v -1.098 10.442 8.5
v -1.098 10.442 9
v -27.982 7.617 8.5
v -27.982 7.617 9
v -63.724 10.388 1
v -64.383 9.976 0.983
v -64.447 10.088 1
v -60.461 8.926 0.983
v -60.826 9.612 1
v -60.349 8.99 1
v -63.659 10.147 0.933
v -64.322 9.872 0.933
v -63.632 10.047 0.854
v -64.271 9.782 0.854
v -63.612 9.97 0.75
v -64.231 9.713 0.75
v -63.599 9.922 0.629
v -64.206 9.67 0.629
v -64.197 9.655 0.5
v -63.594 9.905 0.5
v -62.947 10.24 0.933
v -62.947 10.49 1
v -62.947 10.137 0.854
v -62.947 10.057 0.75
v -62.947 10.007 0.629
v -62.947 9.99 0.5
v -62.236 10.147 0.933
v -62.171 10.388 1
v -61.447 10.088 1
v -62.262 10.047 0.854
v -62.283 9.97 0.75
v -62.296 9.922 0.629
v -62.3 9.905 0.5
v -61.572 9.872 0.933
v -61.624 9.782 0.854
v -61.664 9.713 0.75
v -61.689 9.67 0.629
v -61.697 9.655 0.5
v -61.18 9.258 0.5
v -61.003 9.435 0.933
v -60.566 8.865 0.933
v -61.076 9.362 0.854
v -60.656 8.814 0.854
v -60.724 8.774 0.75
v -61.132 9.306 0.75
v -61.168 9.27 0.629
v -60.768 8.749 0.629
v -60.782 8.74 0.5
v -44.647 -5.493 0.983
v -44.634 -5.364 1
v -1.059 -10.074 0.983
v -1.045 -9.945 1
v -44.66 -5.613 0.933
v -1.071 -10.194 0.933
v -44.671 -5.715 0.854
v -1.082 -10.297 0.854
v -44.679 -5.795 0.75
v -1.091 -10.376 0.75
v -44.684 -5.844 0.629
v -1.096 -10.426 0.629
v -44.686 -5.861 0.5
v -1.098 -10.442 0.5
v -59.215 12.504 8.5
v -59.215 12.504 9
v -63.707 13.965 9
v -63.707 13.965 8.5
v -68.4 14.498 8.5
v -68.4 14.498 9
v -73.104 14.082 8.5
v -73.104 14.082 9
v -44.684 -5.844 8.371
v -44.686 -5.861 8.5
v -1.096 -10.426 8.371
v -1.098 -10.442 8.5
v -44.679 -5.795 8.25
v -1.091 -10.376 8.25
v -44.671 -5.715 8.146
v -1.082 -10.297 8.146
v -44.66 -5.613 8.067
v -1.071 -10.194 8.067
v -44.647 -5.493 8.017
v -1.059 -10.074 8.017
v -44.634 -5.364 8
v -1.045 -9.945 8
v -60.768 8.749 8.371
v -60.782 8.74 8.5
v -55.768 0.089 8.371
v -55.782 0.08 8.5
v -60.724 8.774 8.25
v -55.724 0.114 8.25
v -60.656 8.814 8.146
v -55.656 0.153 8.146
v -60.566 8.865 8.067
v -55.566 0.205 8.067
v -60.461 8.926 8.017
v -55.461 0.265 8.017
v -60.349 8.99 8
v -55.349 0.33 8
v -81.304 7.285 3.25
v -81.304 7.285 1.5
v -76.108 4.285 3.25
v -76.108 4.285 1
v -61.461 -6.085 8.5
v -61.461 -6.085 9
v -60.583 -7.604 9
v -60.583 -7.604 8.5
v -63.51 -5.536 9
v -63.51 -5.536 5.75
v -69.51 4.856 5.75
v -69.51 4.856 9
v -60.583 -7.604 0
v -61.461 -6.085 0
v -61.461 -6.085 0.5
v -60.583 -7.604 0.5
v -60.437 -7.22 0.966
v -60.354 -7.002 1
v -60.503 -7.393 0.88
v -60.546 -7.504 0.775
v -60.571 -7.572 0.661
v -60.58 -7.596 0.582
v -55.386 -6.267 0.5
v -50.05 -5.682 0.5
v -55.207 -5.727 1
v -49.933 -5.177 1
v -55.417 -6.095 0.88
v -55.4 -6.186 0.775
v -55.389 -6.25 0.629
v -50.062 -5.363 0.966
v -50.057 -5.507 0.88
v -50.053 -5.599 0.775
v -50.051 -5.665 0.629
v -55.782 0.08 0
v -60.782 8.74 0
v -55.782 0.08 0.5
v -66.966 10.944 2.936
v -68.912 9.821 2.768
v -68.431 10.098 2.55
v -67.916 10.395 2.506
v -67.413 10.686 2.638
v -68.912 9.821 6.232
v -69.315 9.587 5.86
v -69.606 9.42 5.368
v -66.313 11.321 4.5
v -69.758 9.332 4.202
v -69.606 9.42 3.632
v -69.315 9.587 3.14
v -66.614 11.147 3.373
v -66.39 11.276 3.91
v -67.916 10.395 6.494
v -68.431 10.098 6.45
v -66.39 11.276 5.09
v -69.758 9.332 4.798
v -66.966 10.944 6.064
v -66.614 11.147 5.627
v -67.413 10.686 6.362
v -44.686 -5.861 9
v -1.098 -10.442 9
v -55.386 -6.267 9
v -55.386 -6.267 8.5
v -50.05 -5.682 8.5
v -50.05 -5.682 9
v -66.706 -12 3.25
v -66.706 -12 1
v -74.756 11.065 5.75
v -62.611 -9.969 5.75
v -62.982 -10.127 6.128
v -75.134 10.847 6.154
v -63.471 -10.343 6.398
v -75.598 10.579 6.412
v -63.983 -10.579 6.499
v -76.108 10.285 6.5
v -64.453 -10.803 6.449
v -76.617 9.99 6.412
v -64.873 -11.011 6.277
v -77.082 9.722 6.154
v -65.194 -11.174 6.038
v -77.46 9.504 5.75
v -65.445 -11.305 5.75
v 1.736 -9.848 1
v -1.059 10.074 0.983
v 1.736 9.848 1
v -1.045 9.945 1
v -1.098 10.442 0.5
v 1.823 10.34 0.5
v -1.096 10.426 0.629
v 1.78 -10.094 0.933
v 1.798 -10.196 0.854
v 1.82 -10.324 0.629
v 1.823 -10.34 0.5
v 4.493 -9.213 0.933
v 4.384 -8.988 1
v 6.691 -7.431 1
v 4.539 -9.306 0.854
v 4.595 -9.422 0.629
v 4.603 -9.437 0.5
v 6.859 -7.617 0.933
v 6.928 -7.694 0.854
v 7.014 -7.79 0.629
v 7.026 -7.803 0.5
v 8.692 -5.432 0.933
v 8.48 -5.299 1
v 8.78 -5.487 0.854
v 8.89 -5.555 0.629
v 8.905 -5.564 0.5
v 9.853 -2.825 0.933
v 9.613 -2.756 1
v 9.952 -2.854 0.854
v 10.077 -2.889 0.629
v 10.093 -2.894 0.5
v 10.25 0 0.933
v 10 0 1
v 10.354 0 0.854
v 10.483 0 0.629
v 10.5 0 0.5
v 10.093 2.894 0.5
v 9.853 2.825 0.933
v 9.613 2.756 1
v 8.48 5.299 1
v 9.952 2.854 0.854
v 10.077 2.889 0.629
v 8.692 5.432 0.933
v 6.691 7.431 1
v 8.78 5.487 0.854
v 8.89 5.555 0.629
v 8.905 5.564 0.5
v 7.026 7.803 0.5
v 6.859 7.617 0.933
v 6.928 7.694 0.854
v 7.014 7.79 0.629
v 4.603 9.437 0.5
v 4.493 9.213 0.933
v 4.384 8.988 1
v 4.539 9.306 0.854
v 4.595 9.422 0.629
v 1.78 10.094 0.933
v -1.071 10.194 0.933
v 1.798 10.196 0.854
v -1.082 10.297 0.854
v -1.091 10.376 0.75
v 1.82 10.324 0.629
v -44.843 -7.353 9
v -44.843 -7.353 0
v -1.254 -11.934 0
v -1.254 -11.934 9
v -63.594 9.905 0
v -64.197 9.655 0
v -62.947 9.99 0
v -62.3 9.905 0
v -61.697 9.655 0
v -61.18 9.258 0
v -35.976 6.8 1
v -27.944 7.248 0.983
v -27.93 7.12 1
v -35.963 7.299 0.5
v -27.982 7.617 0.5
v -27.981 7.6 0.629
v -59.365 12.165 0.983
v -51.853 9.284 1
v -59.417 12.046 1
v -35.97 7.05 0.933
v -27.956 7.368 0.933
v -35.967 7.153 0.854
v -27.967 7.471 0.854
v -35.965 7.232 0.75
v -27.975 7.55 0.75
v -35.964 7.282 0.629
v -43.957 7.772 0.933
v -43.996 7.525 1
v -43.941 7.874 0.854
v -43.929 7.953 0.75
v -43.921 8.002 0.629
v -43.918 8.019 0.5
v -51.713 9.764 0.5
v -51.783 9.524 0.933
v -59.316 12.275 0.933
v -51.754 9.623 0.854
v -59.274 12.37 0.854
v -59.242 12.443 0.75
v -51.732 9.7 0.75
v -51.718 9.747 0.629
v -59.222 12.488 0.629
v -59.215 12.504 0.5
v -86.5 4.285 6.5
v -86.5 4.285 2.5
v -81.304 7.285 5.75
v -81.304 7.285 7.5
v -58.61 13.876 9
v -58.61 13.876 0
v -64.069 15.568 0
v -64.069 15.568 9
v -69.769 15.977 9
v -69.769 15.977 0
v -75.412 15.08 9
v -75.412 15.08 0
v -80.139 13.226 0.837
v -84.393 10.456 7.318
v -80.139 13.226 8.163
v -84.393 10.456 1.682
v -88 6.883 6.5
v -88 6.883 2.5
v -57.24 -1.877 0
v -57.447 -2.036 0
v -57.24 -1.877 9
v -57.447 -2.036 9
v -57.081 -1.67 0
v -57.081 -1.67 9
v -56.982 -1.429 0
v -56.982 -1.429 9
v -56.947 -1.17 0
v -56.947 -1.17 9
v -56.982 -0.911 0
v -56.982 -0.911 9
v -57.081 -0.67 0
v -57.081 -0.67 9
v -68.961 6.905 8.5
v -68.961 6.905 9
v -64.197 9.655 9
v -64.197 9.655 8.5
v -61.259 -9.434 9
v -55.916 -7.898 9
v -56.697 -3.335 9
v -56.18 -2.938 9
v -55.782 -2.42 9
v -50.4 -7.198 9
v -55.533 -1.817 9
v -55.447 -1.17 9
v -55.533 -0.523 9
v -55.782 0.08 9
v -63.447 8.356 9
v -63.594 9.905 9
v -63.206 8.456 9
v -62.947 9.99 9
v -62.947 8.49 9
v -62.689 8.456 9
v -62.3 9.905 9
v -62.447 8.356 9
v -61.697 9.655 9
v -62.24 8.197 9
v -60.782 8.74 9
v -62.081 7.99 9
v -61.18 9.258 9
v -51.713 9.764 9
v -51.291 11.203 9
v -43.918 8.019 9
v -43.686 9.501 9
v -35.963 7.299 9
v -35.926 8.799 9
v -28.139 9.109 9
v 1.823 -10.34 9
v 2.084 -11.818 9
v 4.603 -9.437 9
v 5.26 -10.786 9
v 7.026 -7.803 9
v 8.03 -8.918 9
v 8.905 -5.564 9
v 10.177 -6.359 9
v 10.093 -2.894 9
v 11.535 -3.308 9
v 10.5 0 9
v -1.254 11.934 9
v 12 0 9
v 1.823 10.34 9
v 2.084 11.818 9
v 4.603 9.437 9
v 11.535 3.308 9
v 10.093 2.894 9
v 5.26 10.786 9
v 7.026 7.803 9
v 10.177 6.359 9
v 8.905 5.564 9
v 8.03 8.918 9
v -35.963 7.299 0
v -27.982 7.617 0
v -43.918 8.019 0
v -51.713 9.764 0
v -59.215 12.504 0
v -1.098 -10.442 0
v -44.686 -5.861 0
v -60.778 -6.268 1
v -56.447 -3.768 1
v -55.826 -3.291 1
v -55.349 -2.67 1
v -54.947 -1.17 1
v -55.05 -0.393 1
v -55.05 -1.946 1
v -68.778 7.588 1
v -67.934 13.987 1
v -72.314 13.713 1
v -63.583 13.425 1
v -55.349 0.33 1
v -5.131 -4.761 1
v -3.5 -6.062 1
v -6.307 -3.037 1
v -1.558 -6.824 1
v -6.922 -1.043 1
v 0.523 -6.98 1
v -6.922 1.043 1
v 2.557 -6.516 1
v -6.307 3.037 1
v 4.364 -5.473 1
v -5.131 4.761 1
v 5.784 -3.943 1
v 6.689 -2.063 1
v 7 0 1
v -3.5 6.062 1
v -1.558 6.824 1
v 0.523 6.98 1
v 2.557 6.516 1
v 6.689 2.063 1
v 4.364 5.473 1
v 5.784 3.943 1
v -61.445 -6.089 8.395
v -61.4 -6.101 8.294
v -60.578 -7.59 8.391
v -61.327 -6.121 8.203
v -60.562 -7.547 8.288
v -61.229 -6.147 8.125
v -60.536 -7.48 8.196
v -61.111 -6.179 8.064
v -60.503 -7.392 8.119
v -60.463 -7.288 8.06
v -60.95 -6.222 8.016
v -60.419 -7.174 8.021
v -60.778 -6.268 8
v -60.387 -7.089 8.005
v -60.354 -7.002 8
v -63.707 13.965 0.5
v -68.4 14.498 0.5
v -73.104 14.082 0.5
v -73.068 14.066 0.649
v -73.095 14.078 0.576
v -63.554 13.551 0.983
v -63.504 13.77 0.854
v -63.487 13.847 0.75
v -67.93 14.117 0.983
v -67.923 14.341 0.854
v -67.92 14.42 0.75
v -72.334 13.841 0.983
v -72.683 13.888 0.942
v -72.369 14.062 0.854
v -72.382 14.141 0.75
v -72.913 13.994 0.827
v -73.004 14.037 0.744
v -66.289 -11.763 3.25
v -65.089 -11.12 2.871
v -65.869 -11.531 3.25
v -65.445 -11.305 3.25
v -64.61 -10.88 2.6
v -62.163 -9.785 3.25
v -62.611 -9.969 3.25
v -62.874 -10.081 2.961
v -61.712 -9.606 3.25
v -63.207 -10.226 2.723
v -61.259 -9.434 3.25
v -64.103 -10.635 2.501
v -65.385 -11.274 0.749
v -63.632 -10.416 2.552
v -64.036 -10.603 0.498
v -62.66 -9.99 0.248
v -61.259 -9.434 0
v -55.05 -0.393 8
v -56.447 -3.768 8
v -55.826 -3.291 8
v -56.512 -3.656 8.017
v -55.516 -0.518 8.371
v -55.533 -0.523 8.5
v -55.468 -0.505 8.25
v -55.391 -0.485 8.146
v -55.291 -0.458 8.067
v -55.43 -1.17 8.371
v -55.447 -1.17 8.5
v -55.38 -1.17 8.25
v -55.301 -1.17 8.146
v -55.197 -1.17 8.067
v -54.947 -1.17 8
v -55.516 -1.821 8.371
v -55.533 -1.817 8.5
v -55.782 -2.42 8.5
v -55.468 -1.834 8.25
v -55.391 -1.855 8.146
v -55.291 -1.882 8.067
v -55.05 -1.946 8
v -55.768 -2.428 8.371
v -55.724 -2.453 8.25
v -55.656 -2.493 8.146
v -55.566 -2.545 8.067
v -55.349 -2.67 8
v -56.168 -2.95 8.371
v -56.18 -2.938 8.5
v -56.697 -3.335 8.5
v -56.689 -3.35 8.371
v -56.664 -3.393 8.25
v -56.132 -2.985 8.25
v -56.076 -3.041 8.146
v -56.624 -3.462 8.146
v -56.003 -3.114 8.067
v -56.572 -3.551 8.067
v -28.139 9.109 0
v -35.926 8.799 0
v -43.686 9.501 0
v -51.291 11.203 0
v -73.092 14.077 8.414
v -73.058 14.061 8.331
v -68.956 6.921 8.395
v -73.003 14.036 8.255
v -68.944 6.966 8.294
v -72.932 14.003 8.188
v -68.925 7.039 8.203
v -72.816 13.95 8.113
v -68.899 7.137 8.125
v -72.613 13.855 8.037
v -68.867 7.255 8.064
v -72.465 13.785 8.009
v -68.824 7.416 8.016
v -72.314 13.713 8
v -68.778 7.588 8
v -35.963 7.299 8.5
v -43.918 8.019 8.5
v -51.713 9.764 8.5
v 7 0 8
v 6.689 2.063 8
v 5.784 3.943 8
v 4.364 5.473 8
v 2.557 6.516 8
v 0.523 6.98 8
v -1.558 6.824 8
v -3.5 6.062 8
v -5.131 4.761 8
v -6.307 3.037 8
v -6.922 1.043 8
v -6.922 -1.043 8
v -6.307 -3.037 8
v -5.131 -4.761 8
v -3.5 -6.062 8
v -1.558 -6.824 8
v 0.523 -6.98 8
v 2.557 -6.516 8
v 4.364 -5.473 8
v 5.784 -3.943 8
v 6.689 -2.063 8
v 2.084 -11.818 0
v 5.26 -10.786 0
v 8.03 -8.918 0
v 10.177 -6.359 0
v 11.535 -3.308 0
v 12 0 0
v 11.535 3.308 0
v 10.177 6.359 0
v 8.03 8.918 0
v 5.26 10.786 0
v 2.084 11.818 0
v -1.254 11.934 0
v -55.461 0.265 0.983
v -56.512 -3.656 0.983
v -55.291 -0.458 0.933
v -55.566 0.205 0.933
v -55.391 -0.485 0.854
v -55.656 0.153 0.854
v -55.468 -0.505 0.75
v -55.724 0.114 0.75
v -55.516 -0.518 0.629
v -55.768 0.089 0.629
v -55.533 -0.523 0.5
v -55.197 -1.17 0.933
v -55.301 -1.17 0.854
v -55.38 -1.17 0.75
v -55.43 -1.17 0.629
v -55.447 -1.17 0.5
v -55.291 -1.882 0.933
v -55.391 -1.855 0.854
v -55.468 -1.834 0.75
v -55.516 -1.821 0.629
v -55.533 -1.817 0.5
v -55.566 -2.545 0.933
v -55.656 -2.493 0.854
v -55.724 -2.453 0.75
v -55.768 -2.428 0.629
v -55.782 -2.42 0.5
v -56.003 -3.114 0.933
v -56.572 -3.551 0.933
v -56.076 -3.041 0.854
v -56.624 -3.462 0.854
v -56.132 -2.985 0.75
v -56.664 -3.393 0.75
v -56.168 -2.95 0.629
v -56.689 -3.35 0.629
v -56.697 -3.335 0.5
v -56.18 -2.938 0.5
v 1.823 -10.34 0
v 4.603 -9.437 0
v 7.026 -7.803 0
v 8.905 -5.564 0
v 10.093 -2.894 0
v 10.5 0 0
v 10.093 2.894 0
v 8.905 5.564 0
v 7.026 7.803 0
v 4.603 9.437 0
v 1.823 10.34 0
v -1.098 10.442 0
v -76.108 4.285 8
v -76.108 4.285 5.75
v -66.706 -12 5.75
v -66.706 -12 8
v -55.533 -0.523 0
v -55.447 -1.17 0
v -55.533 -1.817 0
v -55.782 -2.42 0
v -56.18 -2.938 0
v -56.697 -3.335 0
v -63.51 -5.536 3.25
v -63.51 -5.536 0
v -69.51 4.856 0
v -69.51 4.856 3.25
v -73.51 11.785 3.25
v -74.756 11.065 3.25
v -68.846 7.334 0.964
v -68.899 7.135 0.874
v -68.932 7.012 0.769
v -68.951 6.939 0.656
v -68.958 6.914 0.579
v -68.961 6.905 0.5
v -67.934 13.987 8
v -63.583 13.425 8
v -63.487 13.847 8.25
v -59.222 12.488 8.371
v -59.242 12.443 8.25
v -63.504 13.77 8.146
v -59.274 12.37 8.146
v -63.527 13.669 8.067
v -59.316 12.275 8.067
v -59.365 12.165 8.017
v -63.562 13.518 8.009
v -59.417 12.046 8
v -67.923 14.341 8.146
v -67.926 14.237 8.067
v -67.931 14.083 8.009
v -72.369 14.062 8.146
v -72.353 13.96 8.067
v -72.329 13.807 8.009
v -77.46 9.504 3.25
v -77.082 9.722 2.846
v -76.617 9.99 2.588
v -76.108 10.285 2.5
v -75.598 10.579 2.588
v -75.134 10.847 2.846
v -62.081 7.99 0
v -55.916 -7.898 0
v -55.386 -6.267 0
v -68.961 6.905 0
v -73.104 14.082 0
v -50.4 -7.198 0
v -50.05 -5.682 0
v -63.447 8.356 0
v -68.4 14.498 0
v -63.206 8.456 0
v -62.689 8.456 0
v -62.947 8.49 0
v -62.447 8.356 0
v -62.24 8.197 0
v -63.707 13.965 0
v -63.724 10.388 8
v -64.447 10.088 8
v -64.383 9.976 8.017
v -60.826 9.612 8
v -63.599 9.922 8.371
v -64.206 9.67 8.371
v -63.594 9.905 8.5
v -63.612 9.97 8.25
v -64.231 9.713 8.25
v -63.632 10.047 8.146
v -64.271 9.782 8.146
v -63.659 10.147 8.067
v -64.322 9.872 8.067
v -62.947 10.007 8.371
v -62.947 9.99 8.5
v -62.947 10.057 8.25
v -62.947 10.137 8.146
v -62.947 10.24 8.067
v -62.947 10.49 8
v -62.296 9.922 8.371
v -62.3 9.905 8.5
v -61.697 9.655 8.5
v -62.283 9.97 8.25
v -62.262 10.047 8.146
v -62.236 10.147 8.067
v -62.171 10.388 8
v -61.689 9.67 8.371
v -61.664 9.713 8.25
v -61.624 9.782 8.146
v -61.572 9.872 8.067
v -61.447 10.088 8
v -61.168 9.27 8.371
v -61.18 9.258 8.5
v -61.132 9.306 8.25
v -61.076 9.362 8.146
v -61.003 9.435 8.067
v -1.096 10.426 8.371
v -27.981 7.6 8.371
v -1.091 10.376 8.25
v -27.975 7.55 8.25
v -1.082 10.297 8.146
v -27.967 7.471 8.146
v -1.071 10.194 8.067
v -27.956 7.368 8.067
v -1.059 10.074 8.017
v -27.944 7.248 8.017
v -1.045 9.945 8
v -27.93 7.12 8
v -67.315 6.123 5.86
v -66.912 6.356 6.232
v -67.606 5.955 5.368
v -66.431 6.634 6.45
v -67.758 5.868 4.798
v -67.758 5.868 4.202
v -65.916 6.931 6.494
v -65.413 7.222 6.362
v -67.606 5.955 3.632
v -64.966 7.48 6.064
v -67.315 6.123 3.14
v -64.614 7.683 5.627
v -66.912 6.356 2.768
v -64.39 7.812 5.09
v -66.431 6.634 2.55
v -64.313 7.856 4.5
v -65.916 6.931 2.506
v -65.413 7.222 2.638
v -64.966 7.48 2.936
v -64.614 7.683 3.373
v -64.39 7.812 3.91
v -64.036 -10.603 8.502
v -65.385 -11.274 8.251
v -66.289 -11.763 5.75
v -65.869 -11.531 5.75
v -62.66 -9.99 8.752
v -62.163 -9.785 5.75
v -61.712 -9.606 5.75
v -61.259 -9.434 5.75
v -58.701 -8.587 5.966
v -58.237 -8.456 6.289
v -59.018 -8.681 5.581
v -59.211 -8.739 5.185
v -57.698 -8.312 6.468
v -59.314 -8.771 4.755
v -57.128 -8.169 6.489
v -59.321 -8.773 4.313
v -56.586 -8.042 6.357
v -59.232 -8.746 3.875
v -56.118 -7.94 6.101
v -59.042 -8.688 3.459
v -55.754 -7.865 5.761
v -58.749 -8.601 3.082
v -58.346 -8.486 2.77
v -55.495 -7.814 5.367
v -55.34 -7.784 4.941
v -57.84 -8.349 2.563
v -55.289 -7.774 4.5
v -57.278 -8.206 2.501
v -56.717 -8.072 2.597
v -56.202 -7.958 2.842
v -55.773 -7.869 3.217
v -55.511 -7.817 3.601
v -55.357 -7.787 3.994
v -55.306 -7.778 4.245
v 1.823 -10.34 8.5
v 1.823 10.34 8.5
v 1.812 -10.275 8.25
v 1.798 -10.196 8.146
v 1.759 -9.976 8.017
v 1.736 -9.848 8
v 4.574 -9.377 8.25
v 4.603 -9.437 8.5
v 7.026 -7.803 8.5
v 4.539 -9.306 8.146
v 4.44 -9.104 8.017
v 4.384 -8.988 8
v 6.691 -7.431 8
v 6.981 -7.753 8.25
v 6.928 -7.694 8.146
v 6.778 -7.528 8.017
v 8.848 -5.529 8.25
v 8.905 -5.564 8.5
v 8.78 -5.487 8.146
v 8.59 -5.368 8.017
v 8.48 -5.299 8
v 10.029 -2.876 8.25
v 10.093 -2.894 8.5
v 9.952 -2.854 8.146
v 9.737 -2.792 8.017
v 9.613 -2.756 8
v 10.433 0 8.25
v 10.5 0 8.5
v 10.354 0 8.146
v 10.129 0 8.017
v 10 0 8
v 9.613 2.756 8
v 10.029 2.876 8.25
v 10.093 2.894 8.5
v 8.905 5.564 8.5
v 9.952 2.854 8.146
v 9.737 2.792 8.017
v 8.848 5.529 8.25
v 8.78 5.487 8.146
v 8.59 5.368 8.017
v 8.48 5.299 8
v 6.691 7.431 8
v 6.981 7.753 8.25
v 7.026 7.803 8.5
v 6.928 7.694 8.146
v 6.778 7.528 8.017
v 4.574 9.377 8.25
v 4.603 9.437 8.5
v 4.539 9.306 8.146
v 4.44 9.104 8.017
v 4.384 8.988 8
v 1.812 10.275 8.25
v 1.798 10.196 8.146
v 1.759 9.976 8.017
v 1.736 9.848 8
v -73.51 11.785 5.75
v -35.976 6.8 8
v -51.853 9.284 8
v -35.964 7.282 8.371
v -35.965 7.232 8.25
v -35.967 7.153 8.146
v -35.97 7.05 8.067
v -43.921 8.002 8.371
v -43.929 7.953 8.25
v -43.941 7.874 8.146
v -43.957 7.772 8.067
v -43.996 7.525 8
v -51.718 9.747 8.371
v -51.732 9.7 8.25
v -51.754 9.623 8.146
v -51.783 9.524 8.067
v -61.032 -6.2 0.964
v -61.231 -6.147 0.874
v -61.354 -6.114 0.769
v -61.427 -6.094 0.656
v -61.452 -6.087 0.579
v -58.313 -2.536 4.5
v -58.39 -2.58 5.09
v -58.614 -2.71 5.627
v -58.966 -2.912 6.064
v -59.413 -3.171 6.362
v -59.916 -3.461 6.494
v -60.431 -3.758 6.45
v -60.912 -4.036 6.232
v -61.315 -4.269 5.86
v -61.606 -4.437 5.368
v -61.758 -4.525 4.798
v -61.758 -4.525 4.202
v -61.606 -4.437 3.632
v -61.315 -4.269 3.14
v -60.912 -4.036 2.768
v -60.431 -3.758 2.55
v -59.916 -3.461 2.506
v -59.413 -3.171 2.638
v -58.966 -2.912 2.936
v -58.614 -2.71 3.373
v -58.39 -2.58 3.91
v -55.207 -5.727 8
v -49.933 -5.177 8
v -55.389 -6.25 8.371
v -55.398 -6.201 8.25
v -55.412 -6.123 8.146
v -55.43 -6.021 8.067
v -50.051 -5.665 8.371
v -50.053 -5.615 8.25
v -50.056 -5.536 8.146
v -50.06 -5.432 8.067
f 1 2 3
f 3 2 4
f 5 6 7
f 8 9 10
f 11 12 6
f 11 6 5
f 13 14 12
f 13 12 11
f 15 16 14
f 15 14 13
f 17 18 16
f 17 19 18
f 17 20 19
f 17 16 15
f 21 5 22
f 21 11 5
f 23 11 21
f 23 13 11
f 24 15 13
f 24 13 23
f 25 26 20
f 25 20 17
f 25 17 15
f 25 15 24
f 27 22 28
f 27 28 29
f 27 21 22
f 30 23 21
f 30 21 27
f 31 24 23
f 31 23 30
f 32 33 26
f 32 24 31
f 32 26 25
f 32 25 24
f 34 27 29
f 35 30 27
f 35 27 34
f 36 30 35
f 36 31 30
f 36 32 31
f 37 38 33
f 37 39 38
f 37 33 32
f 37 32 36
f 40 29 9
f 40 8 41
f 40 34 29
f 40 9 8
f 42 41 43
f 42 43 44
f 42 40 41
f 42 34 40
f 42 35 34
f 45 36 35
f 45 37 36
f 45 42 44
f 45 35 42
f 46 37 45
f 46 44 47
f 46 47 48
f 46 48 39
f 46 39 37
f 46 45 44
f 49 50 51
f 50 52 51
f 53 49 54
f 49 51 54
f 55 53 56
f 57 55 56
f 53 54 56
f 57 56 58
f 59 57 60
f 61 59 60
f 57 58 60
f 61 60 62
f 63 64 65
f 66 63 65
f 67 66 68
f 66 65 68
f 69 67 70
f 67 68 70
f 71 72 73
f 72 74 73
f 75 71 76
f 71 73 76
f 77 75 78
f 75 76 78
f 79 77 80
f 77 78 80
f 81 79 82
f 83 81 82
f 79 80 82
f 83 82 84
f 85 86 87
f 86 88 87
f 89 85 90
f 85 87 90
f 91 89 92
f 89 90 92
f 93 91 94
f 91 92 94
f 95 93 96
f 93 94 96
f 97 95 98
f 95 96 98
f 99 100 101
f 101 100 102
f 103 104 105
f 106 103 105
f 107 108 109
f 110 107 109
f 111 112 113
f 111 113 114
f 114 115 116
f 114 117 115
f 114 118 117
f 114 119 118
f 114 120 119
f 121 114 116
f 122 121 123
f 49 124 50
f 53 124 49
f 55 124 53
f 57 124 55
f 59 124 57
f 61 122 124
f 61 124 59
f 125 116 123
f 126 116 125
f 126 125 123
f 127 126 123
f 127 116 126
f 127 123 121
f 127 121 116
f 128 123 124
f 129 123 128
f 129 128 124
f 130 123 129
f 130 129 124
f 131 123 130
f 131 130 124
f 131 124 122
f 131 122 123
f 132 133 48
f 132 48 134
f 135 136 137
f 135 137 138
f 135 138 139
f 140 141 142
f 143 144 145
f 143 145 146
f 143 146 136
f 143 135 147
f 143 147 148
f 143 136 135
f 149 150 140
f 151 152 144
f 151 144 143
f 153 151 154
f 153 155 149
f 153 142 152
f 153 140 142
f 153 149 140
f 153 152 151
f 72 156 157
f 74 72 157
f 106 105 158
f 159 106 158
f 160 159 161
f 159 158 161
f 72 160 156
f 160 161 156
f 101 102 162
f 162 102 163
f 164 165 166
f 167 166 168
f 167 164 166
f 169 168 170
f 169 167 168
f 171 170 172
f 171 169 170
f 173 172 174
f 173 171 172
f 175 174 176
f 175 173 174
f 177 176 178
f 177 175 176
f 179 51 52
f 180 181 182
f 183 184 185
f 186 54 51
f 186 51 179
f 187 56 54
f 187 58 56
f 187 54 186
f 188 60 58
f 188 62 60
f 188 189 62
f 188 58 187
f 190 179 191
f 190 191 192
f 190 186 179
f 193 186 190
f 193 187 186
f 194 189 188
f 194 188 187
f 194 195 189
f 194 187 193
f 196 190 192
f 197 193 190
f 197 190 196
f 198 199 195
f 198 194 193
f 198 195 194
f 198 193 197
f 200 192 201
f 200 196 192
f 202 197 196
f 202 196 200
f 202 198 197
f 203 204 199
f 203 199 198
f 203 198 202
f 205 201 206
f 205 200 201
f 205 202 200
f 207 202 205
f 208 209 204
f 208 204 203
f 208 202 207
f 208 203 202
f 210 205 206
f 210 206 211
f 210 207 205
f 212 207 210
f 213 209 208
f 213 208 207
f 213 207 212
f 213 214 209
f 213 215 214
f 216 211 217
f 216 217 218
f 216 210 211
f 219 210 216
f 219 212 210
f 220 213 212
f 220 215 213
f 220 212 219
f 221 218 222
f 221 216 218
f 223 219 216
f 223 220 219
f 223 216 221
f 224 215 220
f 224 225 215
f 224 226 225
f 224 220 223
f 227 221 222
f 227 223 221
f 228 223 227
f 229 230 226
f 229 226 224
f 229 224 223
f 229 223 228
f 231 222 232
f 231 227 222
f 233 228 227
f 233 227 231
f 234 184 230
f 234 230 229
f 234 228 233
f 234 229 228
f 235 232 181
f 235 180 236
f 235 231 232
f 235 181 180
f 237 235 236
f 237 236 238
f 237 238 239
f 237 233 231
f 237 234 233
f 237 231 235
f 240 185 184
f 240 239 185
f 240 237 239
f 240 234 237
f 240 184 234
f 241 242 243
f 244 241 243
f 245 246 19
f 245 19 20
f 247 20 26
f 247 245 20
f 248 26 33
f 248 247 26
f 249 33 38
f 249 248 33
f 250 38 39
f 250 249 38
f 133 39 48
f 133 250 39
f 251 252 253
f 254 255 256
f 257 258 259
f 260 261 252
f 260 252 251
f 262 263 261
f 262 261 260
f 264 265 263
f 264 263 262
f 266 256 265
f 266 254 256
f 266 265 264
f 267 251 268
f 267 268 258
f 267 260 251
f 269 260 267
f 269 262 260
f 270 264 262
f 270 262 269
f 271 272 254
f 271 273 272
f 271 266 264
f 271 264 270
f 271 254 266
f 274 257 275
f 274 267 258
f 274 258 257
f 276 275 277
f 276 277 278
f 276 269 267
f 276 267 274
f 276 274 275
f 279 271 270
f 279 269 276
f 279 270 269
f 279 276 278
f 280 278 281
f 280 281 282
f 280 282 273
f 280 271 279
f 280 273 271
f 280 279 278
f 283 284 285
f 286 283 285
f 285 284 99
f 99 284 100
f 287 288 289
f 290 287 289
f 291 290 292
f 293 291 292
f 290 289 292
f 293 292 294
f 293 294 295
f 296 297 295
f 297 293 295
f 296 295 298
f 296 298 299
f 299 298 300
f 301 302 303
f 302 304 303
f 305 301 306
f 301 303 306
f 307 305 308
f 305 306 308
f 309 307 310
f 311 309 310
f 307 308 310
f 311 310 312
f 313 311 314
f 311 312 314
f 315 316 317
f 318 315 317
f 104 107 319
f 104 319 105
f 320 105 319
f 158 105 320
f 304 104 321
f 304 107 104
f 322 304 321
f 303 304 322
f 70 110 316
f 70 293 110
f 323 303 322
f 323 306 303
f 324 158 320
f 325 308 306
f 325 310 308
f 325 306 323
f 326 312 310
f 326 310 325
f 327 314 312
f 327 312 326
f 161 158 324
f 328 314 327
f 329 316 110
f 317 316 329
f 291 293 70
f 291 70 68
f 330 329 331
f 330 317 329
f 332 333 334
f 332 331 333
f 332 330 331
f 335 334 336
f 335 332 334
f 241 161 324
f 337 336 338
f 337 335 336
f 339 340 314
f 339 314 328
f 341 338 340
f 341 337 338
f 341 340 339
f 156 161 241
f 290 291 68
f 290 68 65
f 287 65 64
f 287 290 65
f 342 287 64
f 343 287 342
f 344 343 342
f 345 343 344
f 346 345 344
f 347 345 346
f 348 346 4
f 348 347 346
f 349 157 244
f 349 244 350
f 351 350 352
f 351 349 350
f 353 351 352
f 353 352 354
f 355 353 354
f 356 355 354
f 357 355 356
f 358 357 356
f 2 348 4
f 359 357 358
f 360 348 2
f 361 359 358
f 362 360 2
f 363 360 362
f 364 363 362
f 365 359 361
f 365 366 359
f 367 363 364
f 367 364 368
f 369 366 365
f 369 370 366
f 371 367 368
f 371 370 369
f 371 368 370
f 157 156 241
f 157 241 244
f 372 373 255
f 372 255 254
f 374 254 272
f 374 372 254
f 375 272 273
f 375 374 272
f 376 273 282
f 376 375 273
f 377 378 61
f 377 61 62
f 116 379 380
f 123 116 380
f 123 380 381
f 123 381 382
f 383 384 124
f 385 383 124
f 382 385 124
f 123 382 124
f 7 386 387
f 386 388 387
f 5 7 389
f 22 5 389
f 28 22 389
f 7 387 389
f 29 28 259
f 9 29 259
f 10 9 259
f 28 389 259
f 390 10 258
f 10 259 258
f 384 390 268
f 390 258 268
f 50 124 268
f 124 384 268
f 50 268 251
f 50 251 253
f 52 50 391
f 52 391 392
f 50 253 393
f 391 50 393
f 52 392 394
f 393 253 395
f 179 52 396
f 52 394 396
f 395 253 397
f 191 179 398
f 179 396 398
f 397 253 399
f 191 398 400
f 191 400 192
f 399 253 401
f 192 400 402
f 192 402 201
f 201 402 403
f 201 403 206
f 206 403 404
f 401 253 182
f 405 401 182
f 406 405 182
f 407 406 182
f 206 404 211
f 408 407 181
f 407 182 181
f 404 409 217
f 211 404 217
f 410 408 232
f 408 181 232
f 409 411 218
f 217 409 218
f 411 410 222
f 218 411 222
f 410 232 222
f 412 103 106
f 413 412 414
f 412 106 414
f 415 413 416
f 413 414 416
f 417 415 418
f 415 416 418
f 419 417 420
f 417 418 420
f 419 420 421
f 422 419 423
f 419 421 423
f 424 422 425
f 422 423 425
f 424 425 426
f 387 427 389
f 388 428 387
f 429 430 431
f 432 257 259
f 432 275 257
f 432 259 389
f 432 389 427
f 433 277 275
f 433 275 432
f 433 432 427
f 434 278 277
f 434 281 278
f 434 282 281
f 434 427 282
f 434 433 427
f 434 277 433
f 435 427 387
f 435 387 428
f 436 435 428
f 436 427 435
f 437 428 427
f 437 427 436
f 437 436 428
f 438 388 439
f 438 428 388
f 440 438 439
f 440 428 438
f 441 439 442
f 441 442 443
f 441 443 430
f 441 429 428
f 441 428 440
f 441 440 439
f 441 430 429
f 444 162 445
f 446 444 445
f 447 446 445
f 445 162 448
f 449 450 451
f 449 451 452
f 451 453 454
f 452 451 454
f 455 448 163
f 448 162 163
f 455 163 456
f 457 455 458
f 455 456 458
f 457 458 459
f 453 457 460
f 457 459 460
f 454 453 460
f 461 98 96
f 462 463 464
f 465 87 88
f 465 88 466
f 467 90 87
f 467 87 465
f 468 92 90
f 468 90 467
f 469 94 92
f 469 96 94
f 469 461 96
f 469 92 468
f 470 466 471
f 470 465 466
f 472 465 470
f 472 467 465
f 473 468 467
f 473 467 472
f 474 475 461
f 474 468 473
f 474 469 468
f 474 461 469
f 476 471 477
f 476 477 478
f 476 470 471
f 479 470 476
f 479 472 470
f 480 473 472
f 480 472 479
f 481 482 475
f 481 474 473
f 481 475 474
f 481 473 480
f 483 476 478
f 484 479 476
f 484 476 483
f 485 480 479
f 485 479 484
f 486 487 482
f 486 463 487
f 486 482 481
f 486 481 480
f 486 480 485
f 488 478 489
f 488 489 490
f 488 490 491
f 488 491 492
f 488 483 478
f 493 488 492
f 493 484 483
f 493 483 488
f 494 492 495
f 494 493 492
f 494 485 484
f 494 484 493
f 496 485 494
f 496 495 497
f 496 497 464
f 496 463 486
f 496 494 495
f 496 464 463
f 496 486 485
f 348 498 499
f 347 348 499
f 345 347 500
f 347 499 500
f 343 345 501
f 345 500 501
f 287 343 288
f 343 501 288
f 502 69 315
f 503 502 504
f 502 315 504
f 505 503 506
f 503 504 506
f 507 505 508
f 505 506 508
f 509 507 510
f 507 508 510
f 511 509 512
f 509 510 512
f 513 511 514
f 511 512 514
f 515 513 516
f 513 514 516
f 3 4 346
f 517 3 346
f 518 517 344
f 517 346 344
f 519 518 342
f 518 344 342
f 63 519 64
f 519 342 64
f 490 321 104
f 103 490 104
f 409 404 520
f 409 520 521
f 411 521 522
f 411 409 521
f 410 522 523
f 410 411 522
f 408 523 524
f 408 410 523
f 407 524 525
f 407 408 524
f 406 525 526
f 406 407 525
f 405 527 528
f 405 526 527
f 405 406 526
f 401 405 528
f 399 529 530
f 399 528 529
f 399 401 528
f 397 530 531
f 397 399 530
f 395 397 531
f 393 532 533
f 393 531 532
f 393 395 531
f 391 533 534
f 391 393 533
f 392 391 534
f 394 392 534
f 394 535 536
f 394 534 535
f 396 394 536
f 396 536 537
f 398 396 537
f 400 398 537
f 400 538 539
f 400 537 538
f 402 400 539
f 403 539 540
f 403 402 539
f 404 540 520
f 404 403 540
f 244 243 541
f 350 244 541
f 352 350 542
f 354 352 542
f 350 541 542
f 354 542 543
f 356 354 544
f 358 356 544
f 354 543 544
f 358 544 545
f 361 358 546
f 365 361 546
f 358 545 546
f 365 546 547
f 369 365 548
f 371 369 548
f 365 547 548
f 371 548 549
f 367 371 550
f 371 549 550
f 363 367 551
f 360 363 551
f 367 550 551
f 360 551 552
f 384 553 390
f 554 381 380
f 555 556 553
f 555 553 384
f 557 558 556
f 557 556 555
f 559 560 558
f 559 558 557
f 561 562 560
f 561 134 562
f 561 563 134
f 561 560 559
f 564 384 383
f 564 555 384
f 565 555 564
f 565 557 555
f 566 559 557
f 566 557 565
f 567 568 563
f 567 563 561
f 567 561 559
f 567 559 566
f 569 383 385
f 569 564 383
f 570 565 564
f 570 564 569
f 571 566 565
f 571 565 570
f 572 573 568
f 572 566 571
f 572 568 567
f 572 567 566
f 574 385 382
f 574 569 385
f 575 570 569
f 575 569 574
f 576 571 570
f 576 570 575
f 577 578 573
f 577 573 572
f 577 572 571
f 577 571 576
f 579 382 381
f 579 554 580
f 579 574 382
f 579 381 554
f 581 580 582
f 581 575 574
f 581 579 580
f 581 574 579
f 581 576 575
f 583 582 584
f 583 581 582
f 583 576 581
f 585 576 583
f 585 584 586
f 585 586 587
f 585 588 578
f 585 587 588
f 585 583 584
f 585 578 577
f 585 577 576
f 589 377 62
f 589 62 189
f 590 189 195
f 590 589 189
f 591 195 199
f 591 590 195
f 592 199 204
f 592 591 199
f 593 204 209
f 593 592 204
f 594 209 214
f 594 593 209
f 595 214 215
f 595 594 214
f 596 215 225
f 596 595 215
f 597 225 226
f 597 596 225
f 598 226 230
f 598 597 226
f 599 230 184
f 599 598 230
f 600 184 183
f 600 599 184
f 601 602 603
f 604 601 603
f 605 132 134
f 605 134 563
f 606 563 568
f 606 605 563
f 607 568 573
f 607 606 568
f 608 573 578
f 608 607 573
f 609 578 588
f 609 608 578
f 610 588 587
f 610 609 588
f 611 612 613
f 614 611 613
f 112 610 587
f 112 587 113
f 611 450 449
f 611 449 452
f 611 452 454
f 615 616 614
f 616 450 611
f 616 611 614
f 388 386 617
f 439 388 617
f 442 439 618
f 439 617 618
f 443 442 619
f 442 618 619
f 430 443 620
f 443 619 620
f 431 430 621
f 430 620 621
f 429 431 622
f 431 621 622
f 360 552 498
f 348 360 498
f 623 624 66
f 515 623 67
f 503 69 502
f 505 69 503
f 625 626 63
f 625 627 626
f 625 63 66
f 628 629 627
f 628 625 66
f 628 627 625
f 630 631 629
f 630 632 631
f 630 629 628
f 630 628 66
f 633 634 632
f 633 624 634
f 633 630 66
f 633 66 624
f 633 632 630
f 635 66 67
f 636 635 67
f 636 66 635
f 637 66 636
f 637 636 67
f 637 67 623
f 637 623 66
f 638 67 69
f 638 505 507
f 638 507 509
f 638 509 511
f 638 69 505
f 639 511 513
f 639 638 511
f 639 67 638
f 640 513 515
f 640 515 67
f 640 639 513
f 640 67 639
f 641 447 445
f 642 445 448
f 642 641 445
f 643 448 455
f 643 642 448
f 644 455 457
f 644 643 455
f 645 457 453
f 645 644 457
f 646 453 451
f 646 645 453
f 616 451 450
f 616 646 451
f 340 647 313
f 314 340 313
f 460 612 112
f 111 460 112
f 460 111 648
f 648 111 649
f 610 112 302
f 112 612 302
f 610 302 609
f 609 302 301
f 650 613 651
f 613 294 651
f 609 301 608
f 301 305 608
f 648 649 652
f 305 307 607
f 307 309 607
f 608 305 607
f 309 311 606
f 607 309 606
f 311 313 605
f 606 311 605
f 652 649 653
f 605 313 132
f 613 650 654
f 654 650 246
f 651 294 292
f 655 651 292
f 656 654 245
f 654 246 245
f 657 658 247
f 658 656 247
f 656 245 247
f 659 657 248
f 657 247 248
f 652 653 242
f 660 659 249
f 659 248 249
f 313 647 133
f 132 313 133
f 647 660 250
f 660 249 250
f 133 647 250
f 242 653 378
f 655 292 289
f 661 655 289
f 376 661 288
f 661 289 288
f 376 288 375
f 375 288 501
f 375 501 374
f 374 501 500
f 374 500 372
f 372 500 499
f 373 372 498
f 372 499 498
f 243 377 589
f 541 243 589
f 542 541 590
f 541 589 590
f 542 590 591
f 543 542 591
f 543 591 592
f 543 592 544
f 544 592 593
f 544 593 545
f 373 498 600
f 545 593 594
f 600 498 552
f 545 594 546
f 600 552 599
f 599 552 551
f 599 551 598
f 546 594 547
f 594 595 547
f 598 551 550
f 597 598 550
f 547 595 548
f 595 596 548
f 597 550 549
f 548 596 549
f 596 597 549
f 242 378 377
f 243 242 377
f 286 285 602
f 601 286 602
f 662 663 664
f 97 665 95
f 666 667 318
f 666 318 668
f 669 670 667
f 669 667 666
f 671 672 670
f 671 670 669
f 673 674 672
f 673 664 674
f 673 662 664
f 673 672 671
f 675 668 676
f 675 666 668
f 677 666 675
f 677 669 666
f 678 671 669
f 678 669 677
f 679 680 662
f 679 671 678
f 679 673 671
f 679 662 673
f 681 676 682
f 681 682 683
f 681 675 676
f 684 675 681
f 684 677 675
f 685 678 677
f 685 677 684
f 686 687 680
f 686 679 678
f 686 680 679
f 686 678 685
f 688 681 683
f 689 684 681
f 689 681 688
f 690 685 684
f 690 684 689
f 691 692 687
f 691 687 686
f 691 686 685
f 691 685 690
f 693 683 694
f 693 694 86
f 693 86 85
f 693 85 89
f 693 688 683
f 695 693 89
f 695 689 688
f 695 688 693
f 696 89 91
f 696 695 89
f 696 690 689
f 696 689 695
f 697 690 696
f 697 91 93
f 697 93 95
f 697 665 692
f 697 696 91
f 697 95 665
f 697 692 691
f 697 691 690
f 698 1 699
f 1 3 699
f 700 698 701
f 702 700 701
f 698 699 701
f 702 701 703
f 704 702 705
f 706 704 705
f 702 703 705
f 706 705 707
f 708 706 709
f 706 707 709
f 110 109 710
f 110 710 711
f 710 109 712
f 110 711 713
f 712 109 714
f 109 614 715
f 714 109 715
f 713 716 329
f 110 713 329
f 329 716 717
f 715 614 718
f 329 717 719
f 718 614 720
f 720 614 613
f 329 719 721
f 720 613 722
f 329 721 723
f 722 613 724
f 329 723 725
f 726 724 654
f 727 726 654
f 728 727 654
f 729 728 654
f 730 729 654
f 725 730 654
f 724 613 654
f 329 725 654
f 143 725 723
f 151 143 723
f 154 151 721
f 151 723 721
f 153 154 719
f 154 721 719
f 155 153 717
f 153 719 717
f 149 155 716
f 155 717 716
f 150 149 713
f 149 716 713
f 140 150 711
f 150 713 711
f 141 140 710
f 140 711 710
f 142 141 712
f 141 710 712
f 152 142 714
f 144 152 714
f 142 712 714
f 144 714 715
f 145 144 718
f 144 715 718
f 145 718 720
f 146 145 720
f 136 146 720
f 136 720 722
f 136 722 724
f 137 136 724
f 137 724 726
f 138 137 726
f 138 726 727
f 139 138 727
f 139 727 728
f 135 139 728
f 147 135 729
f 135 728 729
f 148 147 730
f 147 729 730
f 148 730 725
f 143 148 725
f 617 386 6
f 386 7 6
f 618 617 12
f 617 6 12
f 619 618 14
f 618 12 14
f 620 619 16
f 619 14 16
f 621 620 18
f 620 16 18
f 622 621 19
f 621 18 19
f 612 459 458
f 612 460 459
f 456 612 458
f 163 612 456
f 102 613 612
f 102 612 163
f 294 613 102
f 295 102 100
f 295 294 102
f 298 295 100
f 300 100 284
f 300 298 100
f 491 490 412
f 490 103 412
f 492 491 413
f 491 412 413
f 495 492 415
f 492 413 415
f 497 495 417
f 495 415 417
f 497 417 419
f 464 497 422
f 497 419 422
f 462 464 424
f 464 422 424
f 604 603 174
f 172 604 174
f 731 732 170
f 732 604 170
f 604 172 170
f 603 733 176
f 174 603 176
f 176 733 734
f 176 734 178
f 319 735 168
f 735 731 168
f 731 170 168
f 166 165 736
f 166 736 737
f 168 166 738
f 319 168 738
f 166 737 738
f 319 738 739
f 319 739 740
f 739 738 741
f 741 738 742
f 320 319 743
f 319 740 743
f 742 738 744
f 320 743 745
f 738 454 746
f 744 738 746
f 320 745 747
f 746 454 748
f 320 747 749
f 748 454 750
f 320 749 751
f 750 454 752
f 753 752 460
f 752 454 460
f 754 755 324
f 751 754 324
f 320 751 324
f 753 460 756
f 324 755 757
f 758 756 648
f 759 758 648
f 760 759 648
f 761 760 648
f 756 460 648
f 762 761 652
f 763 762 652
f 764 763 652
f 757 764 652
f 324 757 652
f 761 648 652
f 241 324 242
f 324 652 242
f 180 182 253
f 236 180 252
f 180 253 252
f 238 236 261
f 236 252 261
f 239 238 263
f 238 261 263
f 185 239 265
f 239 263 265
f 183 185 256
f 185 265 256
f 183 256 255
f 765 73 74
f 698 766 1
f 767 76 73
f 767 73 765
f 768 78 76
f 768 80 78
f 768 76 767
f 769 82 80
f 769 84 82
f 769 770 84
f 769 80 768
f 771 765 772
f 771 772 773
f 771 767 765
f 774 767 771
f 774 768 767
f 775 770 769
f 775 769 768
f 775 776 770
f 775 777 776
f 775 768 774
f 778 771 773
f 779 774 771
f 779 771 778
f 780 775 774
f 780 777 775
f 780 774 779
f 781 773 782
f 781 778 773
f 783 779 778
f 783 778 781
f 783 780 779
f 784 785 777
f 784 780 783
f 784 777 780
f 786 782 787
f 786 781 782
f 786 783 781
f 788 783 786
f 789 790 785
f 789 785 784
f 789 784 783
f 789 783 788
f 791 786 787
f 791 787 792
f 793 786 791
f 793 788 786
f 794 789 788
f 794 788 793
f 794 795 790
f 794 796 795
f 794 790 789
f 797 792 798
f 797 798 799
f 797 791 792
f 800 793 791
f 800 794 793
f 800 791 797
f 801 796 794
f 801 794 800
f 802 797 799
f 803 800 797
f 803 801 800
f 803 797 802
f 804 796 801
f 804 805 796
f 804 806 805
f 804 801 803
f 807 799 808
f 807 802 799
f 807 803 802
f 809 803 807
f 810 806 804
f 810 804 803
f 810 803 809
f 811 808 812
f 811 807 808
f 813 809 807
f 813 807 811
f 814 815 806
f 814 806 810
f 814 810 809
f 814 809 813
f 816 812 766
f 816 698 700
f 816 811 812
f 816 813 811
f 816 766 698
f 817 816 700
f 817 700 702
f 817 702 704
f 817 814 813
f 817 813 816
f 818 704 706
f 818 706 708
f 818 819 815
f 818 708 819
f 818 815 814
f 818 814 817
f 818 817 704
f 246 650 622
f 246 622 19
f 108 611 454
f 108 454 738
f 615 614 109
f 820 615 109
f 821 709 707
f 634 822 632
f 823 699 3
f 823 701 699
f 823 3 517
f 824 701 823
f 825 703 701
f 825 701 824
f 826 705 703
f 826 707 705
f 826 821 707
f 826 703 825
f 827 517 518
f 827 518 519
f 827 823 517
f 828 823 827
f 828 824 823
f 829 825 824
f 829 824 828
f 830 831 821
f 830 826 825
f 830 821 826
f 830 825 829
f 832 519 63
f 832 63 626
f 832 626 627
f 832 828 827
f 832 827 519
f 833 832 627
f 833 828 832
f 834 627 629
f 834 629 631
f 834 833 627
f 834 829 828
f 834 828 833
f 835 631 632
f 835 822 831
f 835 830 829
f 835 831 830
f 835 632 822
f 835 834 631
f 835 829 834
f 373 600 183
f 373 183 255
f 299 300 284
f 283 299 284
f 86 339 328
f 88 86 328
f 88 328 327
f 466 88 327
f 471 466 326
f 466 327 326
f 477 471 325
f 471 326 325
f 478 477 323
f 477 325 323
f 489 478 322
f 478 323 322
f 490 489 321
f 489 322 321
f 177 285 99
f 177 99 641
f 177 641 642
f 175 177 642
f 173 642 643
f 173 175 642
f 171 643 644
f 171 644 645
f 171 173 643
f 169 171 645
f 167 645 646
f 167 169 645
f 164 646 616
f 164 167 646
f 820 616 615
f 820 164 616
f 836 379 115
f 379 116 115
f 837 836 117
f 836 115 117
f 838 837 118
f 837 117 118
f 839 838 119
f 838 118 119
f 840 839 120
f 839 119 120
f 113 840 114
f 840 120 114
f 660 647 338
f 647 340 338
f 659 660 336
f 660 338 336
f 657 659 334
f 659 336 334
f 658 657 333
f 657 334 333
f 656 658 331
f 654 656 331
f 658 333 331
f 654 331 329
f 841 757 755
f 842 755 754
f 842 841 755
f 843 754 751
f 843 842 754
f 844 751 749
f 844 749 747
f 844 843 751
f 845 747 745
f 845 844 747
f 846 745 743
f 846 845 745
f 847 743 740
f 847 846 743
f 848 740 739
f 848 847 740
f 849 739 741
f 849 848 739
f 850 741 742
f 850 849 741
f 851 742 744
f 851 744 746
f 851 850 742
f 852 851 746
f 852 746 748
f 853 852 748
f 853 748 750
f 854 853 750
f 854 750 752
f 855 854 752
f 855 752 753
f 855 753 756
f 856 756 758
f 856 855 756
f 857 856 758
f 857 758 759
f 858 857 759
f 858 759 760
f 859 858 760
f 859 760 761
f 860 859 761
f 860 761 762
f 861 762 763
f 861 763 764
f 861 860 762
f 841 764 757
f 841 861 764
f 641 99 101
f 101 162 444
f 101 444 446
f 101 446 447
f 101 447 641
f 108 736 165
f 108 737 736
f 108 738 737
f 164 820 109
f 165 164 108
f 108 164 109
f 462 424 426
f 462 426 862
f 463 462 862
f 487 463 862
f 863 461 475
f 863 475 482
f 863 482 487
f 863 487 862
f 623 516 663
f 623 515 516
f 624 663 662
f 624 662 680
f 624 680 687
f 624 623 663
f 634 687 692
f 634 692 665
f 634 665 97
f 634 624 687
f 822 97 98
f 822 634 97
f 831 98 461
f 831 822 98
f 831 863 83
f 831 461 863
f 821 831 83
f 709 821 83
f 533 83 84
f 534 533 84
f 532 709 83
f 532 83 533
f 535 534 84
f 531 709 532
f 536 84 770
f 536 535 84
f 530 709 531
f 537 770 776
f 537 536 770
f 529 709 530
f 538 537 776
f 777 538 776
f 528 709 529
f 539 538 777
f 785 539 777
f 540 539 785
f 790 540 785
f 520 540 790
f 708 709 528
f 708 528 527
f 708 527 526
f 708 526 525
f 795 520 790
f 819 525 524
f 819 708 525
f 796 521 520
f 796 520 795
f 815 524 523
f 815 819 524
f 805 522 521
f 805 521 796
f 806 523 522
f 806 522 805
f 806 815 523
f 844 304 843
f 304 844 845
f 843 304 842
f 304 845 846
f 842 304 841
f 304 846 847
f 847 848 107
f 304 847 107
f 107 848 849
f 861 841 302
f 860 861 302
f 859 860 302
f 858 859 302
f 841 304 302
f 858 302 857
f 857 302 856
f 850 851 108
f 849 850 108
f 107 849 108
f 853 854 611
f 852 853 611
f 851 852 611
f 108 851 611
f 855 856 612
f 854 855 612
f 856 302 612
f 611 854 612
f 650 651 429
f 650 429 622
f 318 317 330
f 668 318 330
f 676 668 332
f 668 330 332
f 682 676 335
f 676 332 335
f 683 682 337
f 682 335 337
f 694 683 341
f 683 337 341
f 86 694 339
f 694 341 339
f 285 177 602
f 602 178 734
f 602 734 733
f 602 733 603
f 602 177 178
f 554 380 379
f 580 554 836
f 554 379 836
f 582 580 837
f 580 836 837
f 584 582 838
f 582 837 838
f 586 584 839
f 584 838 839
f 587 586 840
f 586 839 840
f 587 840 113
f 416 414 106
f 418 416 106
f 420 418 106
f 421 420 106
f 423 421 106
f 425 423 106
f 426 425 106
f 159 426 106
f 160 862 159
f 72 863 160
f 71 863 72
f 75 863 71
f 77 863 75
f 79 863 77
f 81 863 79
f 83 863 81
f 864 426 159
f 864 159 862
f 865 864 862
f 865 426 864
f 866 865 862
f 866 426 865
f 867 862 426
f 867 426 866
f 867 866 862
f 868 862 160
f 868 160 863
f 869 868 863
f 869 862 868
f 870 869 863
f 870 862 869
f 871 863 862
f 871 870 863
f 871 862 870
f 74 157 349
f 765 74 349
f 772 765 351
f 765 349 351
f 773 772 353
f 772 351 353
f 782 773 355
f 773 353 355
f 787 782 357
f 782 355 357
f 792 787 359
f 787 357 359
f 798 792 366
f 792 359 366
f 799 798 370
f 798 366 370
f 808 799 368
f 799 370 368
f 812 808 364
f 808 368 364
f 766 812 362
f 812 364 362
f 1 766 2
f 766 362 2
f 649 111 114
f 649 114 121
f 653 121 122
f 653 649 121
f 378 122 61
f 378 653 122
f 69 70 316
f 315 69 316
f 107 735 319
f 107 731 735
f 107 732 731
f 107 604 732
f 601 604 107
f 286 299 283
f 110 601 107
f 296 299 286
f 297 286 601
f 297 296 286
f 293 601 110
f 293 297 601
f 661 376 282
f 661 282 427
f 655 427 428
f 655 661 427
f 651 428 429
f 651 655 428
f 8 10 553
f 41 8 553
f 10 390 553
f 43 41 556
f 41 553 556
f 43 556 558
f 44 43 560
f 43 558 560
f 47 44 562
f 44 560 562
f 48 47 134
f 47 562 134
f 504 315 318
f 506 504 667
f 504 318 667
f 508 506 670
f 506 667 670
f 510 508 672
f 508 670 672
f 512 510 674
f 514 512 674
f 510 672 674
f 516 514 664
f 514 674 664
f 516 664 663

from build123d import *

# Parameters (mm, degrees)
SKETCH1_R               = 7
BOSS_EXTRUDE1_DEPTH     = 9
CUT_EXTRUDE1_DEPTH      = 83.87446055
CUT_EXTRUDE1_DEPTH_BACK = 4
SKETCH2_R               = 2
CUT_EXTRUDE2_START      = -8
CUT_EXTRUDE2_DEPTH      = 8
CUT_EXTRUDE3_DEPTH      = 84.772444126
CUT_EXTRUDE3_DEPTH_BACK = 84.772444126
FILLET1_R               = 1
CUT_EXTRUDE6_DEPTH      = 1
FILLET2_R               = 0.5
FILLET2_OF_MIRROR1_R    = 0.5


with BuildPart() as part:
    # Sketch1 → Boss-Extrude1 (new body)
    with BuildSketch(Plane.XY):
        with BuildLine():
            Line((-44.842954804, -7.352914883), (-1.254341216, -11.934262781))
            ThreePointArc((-1.254341216, -11.934262781), (12, 0), (-1.254341216, 11.934262781))
            Line((-1.254341216, 11.934262781), (-28.139253345, 9.108544651))
            ThreePointArc((-28.139253345, 9.108544651), (-43.686422074, 9.501145293), (-58.610412286, 13.876428933))
            ThreePointArc((-58.610412286, 13.876428933), (-74.481071491, 15.320859611), (-88, 6.882685902))
            Line((-88, 6.882685902), (-86.5, 4.284609691))
            Line((-86.5, 4.284609691), (-81.303847577, 7.284609691))
            Line((-81.303847577, 7.284609691), (-76.107695155, 4.284609691))
            Line((-76.107695155, 4.284609691), (-66.705771366, -12))
            ThreePointArc((-66.705771366, -12), (-56.142376072, -7.945092459), (-44.842954804, -7.352914883))
        make_face()
        Polygon((-56.581415713, -1.535898385), (-63.509618943, -5.535898385), (-69.509618943, 4.856406461), (-62.581415713, 8.856406461), align=None, mode=Mode.SUBTRACT)
        Circle(SKETCH1_R, mode=Mode.SUBTRACT)
    extrude(amount=BOSS_EXTRUDE1_DEPTH)

    # Sketch2 → Cut-Extrude1 (cut, two sides: drawn at the far end of the back side and taken through both)
    with BuildSketch(Plane(origin=(-19.480290419, 33.740852752, 0), x_dir=(0.8660254037844365, 0.5000000000000039, 0), z_dir=(0.5000000000000038, -0.8660254037844364, 0)).offset(-CUT_EXTRUDE1_DEPTH_BACK)):
        with BuildLine():
            Line((-59.207643082, 3.25), (-57.768892582, 3.25))
            Line((-57.768892582, 3.25), (-57.768892582, 5.75))
            Line((-57.768892582, 5.75), (-59.207643082, 5.75))
            ThreePointArc((-59.207643082, 5.75), (-60.768892582, 6.5), (-62.330142082, 5.75))
            Line((-62.330142082, 5.75), (-68.08829873, 5.75))
            Line((-68.08829873, 5.75), (-68.08829873, 3.25))
            Line((-68.08829873, 3.25), (-62.330142082, 3.25))
            ThreePointArc((-62.330142082, 3.25), (-60.768892582, 2.5), (-59.207643082, 3.25))
        make_face()
        with Locations((-53.768892582, 4.5)):
            Circle(SKETCH2_R)
    extrude(amount=CUT_EXTRUDE1_DEPTH + CUT_EXTRUDE1_DEPTH_BACK, mode=Mode.SUBTRACT)

    # Sketch2_4 → Cut-Extrude2 (cut)
    with BuildSketch(Plane(origin=(-19.480290419, 33.740852752, 0), x_dir=(0.8660254037844365, 0.5000000000000039, 0), z_dir=(0.5000000000000038, -0.8660254037844364, 0)).offset(CUT_EXTRUDE2_START)):
        with BuildLine():
            Line((-59.207643082, 3.25), (-57.768892582, 3.25))
            Line((-57.768892582, 3.25), (-57.768892582, 5.75))
            Line((-57.768892582, 5.75), (-59.207643082, 5.75))
            ThreePointArc((-59.207643082, 5.75), (-60.768892582, 6.5), (-62.330142082, 5.75))
            Line((-62.330142082, 5.75), (-68.08829873, 5.75))
            Line((-68.08829873, 5.75), (-68.08829873, 3.25))
            Line((-68.08829873, 3.25), (-62.330142082, 3.25))
            ThreePointArc((-62.330142082, 3.25), (-60.768892582, 2.5), (-59.207643082, 3.25))
        make_face()
    extrude(amount=CUT_EXTRUDE2_DEPTH, mode=Mode.SUBTRACT)

    # Sketch3 → Cut-Extrude3 (cut, two sides: drawn at the far end of the back side and taken through both)
    with BuildSketch(Plane(origin=(-23.480290419, 40.669055982, 0), x_dir=(0.8660254037844364, 0.5000000000000041, 0), z_dir=(0.5000000000000041, -0.8660254037844364, 0)).offset(-CUT_EXTRUDE3_DEPTH_BACK)):
        Polygon((-57.768892582, 9), (-72.768892582, 9), (-72.768892582, 6.5), align=None)
        Polygon((-57.768892582, 0), (-72.768892582, 2.5), (-72.768892582, 0), align=None)
    extrude(amount=CUT_EXTRUDE3_DEPTH + CUT_EXTRUDE3_DEPTH_BACK, mode=Mode.SUBTRACT)

    # Fillet1
    fillet1_edges = [part.edges().sort_by_distance(p)[0] for p in [
        (-56.581415713, -1.535898385, 4.5),
        (-62.581415713, 8.856406461, 4.5),
    ]]
    fillet(fillet1_edges, radius=FILLET1_R)

    # Sketch5 → Cut-Extrude6 (cut)
    with BuildSketch(Plane.XY.offset(9)):
        with BuildLine():
            Line((-61.460580838, -6.084936491), (-60.58344819, -7.6041748))
            ThreePointArc((-60.58344819, -7.6041748), (-52.728383532, -5.879179053), (-44.686162109, -5.86113204))
            Line((-44.686162109, -5.86113204), (-1.097548864, -10.442479901))
            ThreePointArc((-1.097548864, -10.442479901), (10.5, 0), (-1.097548864, 10.442479901))
            Line((-1.097548864, 10.442479901), (-27.98246065, 7.616761808))
            ThreePointArc((-27.98246065, 7.616761808), (-43.918308598, 8.019177466), (-59.215398565, 12.503843197))
            ThreePointArc((-59.215398565, 12.503843197), (-66.039706904, 14.349674352), (-73.104183378, 14.082374693))
            Line((-73.104183378, 14.082374693), (-68.960580838, 6.905444566))
            Line((-68.960580838, 6.905444566), (-64.197441117, 9.655444566))
            ThreePointArc((-64.197441117, 9.655444566), (-62.300393504, 9.905195622), (-60.782377607, 8.740381057))
            Line((-60.782377607, 8.740381057), (-55.782377607, 0.080127019))
            ThreePointArc((-55.782377607, 0.080127019), (-55.532626551, -1.816920594), (-56.697441117, -3.334936491))
            Line((-56.697441117, -3.334936491), (-61.460580838, -6.084936491))
        make_face()
    cut_extrude6 = extrude(amount=-CUT_EXTRUDE6_DEPTH, mode=Mode.SUBTRACT)

    # Fillet2
    fillet2_edges = [part.edges().sort_by_distance(p)[0] for p in [
        (-55.532626551, -1.816920594, 8),
        (-58.282377607, 4.410254038, 8),
        (-62.300393504, 9.905195622, 8),
        (-66.579010977, 8.280444566, 8),
        (-71.032382108, 10.49390963, 8),
        (-66.039706904, 14.349674352, 8),
        (-14.540004757, 9.029620855, 8),
        (10.5, 0, 8),
        (-22.891855486, -8.151805971, 8),
        (-52.728383532, -5.879179053, 8),
        (-59.079010977, -4.709936491, 8),
        (-43.918308598, 8.019177466, 8),
        (-61.022014514, -6.844555645, 8),
    ]]
    fillet(fillet2_edges, radius=FILLET2_R)

    # Mirror1: Cut-Extrude6 across plane
    add(cut_extrude6.mirror(Plane.XY.offset(4.5)), mode=Mode.SUBTRACT)

    # Fillet2 of Mirror1
    fillet2_of_mirror1_edges = [part.edges().sort_by_distance(p)[0] for p in [
        (-55.532626551, -1.816920594, 1),
        (-58.282377607, 4.410254038, 1),
        (-62.300393504, 9.905195622, 1),
        (-66.579010977, 8.280444566, 1),
        (-71.032382108, 10.49390963, 1),
        (-66.039706904, 14.349674352, 1),
        (-14.540004757, 9.029620855, 1),
        (10.5, 0, 1),
        (-22.891855486, -8.151805971, 1),
        (-52.728383532, -5.879179053, 1),
        (-59.079010977, -4.709936491, 1),
        (-43.918308598, 8.019177466, 1),
        (-61.022014514, -6.844555645, 1),
    ]]
    fillet(fillet2_of_mirror1_edges, radius=FILLET2_OF_MIRROR1_R)


solid = part.part
